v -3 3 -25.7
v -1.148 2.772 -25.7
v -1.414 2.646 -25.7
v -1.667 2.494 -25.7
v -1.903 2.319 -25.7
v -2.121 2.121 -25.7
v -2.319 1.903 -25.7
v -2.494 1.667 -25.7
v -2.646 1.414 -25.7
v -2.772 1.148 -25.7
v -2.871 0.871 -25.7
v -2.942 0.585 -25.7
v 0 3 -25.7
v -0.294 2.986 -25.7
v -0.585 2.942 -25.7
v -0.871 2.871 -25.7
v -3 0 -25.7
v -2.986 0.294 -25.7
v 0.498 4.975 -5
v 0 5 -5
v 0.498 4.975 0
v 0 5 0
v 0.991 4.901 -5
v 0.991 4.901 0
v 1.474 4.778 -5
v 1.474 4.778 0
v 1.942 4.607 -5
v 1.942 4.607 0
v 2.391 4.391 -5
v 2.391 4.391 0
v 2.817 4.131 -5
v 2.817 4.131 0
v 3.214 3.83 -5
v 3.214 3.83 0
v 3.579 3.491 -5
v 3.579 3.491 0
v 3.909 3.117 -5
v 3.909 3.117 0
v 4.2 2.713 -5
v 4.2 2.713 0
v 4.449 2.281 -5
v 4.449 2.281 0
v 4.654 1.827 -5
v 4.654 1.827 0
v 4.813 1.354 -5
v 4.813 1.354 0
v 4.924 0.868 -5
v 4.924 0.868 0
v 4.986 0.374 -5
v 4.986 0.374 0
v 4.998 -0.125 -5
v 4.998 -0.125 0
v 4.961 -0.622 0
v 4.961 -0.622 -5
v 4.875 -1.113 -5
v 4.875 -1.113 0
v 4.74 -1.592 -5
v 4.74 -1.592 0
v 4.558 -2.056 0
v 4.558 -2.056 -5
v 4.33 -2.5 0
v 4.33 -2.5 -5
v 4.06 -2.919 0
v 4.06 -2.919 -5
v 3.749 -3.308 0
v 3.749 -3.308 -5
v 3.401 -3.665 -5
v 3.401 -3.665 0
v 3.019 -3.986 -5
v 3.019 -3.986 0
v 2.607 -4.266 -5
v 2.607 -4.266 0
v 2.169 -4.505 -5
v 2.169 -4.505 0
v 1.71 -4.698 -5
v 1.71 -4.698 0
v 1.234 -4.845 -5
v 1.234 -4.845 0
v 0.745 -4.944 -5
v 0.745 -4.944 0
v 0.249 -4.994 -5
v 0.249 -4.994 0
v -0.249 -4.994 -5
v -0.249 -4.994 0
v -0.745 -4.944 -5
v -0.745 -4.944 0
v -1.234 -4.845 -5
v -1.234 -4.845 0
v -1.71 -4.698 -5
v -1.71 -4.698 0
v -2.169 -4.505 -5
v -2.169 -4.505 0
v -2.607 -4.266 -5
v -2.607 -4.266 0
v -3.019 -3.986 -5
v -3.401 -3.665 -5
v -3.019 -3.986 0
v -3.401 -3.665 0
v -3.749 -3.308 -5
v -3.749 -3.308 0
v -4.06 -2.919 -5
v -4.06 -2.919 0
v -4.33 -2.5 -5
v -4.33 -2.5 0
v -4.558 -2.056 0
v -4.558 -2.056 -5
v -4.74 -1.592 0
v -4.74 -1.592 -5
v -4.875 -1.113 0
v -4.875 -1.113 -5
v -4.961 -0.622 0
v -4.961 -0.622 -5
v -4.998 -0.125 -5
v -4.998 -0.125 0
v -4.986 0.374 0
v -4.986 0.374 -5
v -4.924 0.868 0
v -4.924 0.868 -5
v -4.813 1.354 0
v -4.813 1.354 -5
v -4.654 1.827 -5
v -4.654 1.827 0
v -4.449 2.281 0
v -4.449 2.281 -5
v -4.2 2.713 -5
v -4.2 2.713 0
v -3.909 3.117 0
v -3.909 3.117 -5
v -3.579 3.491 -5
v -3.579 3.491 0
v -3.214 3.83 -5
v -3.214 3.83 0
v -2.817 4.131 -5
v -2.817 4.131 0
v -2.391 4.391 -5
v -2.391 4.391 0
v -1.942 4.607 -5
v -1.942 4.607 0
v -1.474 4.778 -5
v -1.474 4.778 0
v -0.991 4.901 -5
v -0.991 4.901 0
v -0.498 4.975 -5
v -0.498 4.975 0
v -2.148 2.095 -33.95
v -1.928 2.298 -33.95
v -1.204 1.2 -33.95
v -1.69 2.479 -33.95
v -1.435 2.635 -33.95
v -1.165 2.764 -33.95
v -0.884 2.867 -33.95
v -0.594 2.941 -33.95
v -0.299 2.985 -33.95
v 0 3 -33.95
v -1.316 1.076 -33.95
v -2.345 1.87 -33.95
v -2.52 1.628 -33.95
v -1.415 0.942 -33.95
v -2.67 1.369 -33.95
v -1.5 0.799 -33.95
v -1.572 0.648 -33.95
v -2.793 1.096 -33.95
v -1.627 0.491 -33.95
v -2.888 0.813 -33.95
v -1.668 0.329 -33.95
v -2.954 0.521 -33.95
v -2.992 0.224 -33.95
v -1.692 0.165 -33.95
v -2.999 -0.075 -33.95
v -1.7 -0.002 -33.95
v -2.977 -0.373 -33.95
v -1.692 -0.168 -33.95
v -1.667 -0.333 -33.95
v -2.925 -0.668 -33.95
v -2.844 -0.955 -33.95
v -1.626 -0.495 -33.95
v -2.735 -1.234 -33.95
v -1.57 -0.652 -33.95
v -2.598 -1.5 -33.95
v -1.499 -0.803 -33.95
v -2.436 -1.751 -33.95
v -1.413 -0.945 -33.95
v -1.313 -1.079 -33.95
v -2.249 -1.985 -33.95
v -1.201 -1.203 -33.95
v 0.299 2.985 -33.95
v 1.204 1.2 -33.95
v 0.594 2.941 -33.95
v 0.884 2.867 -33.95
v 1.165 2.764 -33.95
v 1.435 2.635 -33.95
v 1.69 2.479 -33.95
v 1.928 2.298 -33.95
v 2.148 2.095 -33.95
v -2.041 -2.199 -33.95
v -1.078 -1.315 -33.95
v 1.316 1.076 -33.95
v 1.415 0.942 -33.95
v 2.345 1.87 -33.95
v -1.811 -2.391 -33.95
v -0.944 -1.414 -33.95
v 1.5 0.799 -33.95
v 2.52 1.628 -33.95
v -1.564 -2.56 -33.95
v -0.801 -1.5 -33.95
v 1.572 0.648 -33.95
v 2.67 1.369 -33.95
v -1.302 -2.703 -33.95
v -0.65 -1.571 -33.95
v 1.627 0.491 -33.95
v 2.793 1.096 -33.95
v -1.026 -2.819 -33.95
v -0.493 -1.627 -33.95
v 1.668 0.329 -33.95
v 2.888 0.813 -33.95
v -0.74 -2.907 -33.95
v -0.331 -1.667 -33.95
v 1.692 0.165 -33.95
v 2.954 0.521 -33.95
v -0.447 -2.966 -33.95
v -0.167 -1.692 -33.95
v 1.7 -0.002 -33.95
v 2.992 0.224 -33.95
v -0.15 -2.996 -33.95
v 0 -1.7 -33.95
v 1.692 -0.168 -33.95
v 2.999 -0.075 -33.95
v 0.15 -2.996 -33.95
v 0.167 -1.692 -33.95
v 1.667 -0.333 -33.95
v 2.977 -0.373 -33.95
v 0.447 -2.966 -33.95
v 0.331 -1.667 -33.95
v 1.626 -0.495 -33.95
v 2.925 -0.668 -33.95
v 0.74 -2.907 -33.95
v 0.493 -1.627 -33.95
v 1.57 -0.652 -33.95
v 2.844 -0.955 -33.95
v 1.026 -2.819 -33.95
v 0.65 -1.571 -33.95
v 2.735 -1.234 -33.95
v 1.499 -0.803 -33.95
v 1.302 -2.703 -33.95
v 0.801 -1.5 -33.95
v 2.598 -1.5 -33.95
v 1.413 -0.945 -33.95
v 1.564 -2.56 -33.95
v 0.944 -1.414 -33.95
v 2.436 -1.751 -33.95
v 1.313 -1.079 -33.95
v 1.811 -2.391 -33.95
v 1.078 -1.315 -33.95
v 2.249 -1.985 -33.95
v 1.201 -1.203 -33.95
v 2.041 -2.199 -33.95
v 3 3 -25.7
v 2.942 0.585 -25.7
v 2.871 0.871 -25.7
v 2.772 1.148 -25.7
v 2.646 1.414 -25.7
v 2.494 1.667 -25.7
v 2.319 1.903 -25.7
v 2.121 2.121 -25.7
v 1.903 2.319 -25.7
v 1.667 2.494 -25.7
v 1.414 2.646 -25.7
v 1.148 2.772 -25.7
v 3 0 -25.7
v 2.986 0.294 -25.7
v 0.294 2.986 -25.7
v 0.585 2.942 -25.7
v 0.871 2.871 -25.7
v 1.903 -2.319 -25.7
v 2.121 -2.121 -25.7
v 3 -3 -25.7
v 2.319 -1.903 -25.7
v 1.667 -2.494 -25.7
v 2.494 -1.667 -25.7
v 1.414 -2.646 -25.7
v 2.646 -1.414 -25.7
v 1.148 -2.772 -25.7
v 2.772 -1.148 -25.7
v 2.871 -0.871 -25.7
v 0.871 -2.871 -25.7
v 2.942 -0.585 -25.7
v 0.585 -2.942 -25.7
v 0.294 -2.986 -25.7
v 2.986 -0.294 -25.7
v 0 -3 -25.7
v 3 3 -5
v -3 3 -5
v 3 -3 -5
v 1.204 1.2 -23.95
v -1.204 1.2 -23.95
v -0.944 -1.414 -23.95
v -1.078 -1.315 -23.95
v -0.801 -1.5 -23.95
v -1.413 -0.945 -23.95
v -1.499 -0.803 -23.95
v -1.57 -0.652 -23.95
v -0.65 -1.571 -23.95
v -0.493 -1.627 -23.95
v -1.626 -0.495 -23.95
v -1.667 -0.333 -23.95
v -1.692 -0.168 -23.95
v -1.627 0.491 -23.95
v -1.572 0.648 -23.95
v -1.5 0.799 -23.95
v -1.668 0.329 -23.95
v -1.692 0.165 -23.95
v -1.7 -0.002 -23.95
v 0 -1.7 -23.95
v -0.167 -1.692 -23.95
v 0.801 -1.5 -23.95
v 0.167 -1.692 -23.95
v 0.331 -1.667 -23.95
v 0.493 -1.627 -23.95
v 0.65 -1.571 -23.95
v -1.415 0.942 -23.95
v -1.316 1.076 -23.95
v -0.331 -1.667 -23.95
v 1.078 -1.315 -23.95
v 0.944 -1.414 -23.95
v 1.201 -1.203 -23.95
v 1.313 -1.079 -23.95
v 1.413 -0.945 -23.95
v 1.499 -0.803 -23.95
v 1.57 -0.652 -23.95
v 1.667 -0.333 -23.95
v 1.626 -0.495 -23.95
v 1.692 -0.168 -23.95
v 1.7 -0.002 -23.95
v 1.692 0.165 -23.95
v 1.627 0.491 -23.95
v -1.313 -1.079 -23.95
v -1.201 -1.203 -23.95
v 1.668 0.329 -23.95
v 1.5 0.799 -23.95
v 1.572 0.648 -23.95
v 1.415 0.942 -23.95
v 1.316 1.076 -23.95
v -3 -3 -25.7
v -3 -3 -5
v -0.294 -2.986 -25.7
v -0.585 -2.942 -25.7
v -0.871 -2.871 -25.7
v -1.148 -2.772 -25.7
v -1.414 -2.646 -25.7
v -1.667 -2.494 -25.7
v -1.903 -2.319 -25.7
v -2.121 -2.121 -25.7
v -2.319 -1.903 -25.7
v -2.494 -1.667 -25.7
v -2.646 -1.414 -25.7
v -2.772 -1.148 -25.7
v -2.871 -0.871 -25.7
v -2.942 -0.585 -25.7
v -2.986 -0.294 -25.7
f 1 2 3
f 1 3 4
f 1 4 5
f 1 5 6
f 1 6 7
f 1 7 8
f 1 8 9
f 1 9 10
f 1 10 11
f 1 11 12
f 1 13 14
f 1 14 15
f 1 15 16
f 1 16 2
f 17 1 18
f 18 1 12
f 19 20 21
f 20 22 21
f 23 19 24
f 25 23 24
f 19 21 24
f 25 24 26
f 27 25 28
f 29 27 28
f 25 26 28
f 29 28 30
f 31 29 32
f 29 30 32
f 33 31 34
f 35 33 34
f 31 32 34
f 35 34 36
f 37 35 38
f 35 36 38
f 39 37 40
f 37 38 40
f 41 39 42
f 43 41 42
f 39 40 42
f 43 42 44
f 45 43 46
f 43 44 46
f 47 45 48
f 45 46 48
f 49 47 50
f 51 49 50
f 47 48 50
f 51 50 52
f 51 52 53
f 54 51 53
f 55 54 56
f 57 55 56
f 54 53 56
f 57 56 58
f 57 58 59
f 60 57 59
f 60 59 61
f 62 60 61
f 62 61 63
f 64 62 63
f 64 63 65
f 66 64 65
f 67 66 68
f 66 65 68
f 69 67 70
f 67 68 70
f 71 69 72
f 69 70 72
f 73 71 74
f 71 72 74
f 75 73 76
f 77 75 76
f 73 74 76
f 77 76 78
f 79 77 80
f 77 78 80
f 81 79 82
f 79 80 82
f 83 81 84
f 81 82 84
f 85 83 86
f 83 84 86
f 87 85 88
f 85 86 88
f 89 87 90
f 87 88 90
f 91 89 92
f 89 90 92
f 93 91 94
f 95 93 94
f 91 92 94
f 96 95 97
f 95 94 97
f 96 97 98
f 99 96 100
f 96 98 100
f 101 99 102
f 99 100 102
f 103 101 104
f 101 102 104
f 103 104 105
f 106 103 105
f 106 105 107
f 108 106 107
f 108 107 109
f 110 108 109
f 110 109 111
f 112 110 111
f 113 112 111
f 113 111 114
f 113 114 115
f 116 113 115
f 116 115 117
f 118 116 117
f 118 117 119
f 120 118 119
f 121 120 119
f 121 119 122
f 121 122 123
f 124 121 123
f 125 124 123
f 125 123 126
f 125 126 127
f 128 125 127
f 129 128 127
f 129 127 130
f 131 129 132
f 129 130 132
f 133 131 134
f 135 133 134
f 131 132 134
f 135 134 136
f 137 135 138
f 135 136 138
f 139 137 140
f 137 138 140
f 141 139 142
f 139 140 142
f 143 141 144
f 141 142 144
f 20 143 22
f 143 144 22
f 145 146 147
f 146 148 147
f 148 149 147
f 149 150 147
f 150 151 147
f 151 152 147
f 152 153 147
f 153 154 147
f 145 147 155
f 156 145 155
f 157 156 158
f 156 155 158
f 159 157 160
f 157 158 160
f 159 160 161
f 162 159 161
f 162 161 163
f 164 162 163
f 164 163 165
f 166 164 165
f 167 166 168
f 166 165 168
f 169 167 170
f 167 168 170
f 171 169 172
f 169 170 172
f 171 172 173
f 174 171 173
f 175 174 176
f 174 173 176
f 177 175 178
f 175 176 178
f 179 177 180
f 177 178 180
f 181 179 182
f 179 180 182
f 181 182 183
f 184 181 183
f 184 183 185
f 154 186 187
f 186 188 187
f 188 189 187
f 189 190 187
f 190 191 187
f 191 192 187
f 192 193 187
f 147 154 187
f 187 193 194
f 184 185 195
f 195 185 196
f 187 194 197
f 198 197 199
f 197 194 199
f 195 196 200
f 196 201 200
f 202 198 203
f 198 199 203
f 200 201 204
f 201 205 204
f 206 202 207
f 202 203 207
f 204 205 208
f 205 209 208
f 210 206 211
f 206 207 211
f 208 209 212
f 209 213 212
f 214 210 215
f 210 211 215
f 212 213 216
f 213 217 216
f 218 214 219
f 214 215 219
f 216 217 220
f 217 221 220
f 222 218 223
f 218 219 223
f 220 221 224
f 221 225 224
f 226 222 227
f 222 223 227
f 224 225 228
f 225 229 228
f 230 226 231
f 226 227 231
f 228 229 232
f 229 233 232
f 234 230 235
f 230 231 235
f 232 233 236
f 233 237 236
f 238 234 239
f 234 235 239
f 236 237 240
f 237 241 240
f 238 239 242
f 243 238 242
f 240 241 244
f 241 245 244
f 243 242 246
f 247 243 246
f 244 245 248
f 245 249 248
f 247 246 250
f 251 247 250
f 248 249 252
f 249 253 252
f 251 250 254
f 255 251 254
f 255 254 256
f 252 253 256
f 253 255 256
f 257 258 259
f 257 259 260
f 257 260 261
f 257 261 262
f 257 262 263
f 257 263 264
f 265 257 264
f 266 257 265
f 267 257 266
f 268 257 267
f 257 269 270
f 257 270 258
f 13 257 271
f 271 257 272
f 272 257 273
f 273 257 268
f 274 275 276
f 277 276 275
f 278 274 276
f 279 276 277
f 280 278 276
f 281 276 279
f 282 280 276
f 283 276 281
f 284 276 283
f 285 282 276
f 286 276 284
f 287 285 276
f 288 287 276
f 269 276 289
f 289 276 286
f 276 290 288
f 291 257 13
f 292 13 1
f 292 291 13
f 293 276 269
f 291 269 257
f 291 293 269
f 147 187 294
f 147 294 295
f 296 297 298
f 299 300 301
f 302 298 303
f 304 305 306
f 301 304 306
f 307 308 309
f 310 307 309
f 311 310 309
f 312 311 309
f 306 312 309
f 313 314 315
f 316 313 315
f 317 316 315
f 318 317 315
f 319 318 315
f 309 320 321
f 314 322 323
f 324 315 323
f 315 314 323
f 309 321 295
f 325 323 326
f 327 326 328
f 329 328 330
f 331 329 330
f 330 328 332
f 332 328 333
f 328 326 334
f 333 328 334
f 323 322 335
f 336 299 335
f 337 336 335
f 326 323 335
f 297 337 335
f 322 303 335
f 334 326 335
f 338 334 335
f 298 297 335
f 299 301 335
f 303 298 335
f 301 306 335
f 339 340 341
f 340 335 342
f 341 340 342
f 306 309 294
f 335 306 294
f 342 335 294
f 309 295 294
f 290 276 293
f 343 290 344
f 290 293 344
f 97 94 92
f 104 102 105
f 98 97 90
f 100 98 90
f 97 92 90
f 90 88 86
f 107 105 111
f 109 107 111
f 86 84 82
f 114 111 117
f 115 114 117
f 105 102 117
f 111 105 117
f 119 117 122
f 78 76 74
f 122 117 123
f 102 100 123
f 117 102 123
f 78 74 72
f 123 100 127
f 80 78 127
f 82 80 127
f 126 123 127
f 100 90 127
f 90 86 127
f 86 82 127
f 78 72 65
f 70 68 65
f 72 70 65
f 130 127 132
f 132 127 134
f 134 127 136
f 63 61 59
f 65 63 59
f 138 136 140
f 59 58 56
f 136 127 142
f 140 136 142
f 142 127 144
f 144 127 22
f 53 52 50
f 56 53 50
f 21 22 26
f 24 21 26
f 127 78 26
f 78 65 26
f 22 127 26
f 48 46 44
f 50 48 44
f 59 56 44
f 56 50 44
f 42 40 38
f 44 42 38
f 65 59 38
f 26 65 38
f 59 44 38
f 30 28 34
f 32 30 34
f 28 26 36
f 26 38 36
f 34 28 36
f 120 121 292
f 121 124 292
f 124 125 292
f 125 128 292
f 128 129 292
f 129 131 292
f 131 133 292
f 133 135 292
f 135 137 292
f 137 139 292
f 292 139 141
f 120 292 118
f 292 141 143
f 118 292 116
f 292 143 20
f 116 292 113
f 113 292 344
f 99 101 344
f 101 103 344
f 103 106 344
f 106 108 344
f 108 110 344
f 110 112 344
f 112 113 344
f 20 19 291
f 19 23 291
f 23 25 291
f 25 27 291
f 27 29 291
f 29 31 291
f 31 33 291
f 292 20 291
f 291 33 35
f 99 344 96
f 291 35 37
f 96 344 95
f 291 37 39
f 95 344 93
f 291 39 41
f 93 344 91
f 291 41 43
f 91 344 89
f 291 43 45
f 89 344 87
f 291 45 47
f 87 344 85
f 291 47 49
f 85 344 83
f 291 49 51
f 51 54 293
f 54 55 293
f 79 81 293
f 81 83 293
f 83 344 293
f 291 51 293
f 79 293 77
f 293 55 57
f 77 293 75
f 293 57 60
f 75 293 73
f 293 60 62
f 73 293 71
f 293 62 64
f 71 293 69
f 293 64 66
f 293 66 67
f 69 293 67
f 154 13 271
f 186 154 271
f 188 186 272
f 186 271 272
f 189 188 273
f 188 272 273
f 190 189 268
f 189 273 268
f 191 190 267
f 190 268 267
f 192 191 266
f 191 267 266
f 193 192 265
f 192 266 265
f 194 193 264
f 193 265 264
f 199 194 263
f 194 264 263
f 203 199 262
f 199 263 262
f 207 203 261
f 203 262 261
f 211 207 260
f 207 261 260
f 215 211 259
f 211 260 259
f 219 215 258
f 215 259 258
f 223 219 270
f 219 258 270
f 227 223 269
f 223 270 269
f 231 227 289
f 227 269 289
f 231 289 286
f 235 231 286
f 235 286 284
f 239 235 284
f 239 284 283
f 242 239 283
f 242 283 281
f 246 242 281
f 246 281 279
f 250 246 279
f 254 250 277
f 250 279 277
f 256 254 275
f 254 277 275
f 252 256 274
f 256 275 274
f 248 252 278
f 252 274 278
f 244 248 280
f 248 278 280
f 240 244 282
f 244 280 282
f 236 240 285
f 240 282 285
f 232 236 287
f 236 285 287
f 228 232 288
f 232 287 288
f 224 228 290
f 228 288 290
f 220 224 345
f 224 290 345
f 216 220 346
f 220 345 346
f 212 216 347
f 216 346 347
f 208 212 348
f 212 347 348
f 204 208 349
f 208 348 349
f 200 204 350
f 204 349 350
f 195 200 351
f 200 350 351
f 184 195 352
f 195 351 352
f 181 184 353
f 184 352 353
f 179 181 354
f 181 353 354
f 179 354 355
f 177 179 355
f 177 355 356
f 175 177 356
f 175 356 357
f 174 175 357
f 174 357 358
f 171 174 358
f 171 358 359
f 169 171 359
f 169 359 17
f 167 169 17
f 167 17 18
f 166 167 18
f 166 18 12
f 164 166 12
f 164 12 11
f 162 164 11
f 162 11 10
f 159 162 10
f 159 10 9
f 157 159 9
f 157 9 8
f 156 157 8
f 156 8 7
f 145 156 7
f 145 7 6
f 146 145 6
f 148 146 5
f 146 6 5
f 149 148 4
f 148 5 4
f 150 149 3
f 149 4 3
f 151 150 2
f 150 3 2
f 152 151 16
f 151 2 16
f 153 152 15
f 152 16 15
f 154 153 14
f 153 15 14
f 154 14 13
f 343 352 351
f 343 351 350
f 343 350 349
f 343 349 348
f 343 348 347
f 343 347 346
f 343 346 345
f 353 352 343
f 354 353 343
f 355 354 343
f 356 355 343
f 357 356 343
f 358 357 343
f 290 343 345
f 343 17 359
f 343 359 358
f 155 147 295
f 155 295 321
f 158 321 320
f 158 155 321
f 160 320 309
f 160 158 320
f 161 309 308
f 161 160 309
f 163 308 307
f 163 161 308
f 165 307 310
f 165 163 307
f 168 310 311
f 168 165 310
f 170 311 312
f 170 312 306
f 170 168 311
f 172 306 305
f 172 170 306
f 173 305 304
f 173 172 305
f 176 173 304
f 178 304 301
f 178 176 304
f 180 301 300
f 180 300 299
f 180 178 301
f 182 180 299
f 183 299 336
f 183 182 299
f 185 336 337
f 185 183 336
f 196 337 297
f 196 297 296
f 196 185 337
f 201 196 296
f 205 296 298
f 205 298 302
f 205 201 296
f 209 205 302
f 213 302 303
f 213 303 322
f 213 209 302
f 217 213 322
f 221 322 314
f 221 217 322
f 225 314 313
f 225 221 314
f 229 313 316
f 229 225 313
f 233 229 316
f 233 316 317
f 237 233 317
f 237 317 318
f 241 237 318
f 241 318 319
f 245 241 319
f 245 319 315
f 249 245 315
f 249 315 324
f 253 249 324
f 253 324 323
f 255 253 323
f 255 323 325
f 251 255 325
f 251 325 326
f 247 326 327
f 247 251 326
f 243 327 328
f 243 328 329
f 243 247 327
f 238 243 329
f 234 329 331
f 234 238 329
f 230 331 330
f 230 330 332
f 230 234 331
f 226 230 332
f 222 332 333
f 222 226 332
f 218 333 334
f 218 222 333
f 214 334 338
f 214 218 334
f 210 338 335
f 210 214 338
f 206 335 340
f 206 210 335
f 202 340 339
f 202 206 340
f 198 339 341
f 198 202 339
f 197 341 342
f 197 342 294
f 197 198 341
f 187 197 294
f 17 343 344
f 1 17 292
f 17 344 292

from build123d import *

# Parameters (mm, degrees)
ESQUISSE6_W             = 6
ESQUISSE6_H             = 6
BOSS_EXTRU_2_DEPTH      = 20.7
ENL_V_MAT_EXTRU_1_DEPTH = 10


with BuildPart() as part:
    # Esquisse2 → Révolution1 (revolve)
    with BuildSketch(Plane(origin=(0, 0, 0), x_dir=(0, 0, -1), z_dir=(1, 0, 0))):
        Polygon((0, 0), (33.95, 0), (33.95, 3), (5, 3), (5, 5), (0, 5), align=None)
    revolve(axis=Axis((0, 0, 0), (0, 0, -1)))

    # Esquisse6 → Boss.-Extru.2 (add)
    with BuildSketch(Plane(origin=(0, 0, -5), x_dir=(-1, 0, 0), z_dir=(0, 0, -1))):
        Rectangle(ESQUISSE6_W, ESQUISSE6_H)
    extrude(amount=BOSS_EXTRU_2_DEPTH)

    # Esquisse4 → Enlèv. mat.-Extru.1 (cut)
    with BuildSketch(Plane(origin=(0, 0, -33.95), x_dir=(-1, 0, 0), z_dir=(0, 0, -1))):
        with BuildLine():
            Line((-1.204159458, 1.2), (1.204159458, 1.2))
            ThreePointArc((1.204159458, 1.2), (0, -1.7), (-1.204159458, 1.2))
        make_face()
    extrude(amount=-ENL_V_MAT_EXTRU_1_DEPTH, mode=Mode.SUBTRACT)


solid = part.part
